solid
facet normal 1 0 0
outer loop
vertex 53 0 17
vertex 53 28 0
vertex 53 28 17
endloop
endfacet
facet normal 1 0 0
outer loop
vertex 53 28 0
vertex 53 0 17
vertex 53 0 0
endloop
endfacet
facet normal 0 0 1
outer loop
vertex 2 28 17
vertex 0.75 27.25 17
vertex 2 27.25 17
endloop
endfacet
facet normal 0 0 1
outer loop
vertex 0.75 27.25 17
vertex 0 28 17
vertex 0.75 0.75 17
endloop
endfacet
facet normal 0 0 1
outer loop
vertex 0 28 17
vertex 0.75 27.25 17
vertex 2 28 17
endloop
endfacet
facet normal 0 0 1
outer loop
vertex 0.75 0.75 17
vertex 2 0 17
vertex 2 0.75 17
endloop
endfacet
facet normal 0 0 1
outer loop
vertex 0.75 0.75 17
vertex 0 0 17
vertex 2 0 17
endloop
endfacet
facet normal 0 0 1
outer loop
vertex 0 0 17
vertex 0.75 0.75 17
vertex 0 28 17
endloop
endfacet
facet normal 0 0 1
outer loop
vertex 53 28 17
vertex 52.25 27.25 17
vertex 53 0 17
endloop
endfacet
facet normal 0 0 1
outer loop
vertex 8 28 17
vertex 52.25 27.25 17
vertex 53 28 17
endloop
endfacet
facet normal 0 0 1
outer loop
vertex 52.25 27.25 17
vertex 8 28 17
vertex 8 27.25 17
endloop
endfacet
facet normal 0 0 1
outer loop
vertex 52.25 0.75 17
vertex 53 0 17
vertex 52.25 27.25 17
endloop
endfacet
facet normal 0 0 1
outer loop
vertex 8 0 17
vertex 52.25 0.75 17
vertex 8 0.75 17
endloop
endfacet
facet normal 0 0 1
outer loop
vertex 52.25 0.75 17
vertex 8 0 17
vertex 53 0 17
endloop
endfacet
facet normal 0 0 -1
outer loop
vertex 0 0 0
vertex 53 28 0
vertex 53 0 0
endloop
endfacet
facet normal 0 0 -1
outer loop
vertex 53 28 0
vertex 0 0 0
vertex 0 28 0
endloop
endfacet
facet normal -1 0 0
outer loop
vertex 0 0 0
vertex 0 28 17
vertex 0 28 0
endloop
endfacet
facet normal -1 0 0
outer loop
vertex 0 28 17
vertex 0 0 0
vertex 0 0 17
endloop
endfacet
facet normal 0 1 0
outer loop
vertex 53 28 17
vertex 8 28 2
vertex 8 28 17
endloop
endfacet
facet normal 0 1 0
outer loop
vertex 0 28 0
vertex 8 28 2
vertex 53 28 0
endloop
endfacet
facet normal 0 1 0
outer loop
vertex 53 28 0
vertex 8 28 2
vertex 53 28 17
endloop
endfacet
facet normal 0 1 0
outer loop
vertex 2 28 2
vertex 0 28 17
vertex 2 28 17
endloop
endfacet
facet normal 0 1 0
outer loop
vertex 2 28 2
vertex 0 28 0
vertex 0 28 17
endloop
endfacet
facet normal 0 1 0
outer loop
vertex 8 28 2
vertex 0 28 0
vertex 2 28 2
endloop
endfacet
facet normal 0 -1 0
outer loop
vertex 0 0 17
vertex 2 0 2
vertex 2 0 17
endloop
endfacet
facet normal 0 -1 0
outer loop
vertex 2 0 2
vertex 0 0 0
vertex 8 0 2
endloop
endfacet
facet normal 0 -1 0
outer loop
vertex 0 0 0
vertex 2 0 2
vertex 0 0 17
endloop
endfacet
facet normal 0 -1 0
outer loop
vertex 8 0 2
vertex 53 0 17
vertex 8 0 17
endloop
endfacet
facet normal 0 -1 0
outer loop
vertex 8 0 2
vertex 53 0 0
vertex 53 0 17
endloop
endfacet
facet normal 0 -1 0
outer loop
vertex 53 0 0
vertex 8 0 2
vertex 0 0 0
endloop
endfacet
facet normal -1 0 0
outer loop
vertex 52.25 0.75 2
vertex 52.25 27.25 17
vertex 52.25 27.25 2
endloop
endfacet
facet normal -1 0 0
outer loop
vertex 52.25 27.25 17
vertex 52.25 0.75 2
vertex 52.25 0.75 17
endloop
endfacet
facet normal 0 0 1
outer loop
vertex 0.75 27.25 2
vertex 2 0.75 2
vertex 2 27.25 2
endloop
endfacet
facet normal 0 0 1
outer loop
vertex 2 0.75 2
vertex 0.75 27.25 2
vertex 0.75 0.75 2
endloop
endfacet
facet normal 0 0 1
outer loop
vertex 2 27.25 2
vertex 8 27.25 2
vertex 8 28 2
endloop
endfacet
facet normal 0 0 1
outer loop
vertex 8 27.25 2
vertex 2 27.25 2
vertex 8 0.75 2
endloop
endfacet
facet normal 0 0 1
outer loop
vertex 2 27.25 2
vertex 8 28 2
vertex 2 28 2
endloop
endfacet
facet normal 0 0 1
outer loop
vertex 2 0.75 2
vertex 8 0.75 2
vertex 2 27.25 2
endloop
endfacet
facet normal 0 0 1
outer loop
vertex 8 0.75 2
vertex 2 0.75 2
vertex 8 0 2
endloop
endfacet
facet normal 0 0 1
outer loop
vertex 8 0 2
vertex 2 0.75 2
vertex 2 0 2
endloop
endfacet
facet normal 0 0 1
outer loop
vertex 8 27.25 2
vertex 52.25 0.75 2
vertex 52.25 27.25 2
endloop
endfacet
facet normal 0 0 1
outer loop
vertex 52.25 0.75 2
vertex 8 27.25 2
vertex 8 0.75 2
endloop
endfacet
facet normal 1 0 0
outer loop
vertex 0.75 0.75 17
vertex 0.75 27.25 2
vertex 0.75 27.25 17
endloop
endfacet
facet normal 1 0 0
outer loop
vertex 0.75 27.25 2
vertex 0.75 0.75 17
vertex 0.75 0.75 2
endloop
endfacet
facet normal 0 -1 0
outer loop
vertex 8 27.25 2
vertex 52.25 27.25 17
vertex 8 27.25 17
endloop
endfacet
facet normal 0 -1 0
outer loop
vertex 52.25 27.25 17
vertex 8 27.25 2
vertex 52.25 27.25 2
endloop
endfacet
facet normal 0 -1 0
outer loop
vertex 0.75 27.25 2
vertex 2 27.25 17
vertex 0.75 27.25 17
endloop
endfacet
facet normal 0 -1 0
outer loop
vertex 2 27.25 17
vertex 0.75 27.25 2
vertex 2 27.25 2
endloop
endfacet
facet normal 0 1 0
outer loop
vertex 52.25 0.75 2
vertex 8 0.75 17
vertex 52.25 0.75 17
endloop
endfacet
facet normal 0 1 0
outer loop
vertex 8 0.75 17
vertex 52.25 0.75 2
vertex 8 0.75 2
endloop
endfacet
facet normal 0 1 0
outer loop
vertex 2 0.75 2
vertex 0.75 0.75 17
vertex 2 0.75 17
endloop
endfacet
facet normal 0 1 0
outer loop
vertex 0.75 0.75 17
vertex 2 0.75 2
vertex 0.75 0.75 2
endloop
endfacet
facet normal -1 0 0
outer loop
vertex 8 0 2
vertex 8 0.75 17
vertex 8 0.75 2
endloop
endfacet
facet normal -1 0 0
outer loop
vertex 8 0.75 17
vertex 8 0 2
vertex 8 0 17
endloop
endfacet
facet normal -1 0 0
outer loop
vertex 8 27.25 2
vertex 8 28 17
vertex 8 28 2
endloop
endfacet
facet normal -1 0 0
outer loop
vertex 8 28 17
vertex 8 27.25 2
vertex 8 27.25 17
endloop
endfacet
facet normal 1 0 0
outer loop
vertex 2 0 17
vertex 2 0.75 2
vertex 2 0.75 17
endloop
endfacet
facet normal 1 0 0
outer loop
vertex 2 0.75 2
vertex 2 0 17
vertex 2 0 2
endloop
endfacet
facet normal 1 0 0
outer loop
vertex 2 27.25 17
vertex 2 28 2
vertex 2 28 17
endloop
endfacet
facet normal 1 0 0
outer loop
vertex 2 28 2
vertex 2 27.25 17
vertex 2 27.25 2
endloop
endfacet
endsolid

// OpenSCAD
/*

	holder for 9V block battery

	2015 by ChrisMicro
*/

batteryLength=45;
batteryWidth=26;
batterHeight=17;

wallThickness=1;
wallHeight=15;

BatteryClipThickness=6;

manuFactoringOffset=0.5;


totalLength=batteryLength+BatteryClipThickness;

difference()
{
	// housing
	cube([totalLength+2*wallThickness,batteryWidth+2*wallThickness,wallHeight+2*wallThickness]);
	// battery
	translate([wallThickness-manuFactoringOffset/2,wallThickness-manuFactoringOffset/2,wallThickness*2])
		cube([totalLength+manuFactoringOffset,batteryWidth+manuFactoringOffset,batterHeight+manuFactoringOffset]);
	// batteryClip
translate([wallThickness*2,0,wallThickness*2])
		cube([BatteryClipThickness,batteryLength+2*wallThickness,batterHeight+2*wallThickness]);
}
